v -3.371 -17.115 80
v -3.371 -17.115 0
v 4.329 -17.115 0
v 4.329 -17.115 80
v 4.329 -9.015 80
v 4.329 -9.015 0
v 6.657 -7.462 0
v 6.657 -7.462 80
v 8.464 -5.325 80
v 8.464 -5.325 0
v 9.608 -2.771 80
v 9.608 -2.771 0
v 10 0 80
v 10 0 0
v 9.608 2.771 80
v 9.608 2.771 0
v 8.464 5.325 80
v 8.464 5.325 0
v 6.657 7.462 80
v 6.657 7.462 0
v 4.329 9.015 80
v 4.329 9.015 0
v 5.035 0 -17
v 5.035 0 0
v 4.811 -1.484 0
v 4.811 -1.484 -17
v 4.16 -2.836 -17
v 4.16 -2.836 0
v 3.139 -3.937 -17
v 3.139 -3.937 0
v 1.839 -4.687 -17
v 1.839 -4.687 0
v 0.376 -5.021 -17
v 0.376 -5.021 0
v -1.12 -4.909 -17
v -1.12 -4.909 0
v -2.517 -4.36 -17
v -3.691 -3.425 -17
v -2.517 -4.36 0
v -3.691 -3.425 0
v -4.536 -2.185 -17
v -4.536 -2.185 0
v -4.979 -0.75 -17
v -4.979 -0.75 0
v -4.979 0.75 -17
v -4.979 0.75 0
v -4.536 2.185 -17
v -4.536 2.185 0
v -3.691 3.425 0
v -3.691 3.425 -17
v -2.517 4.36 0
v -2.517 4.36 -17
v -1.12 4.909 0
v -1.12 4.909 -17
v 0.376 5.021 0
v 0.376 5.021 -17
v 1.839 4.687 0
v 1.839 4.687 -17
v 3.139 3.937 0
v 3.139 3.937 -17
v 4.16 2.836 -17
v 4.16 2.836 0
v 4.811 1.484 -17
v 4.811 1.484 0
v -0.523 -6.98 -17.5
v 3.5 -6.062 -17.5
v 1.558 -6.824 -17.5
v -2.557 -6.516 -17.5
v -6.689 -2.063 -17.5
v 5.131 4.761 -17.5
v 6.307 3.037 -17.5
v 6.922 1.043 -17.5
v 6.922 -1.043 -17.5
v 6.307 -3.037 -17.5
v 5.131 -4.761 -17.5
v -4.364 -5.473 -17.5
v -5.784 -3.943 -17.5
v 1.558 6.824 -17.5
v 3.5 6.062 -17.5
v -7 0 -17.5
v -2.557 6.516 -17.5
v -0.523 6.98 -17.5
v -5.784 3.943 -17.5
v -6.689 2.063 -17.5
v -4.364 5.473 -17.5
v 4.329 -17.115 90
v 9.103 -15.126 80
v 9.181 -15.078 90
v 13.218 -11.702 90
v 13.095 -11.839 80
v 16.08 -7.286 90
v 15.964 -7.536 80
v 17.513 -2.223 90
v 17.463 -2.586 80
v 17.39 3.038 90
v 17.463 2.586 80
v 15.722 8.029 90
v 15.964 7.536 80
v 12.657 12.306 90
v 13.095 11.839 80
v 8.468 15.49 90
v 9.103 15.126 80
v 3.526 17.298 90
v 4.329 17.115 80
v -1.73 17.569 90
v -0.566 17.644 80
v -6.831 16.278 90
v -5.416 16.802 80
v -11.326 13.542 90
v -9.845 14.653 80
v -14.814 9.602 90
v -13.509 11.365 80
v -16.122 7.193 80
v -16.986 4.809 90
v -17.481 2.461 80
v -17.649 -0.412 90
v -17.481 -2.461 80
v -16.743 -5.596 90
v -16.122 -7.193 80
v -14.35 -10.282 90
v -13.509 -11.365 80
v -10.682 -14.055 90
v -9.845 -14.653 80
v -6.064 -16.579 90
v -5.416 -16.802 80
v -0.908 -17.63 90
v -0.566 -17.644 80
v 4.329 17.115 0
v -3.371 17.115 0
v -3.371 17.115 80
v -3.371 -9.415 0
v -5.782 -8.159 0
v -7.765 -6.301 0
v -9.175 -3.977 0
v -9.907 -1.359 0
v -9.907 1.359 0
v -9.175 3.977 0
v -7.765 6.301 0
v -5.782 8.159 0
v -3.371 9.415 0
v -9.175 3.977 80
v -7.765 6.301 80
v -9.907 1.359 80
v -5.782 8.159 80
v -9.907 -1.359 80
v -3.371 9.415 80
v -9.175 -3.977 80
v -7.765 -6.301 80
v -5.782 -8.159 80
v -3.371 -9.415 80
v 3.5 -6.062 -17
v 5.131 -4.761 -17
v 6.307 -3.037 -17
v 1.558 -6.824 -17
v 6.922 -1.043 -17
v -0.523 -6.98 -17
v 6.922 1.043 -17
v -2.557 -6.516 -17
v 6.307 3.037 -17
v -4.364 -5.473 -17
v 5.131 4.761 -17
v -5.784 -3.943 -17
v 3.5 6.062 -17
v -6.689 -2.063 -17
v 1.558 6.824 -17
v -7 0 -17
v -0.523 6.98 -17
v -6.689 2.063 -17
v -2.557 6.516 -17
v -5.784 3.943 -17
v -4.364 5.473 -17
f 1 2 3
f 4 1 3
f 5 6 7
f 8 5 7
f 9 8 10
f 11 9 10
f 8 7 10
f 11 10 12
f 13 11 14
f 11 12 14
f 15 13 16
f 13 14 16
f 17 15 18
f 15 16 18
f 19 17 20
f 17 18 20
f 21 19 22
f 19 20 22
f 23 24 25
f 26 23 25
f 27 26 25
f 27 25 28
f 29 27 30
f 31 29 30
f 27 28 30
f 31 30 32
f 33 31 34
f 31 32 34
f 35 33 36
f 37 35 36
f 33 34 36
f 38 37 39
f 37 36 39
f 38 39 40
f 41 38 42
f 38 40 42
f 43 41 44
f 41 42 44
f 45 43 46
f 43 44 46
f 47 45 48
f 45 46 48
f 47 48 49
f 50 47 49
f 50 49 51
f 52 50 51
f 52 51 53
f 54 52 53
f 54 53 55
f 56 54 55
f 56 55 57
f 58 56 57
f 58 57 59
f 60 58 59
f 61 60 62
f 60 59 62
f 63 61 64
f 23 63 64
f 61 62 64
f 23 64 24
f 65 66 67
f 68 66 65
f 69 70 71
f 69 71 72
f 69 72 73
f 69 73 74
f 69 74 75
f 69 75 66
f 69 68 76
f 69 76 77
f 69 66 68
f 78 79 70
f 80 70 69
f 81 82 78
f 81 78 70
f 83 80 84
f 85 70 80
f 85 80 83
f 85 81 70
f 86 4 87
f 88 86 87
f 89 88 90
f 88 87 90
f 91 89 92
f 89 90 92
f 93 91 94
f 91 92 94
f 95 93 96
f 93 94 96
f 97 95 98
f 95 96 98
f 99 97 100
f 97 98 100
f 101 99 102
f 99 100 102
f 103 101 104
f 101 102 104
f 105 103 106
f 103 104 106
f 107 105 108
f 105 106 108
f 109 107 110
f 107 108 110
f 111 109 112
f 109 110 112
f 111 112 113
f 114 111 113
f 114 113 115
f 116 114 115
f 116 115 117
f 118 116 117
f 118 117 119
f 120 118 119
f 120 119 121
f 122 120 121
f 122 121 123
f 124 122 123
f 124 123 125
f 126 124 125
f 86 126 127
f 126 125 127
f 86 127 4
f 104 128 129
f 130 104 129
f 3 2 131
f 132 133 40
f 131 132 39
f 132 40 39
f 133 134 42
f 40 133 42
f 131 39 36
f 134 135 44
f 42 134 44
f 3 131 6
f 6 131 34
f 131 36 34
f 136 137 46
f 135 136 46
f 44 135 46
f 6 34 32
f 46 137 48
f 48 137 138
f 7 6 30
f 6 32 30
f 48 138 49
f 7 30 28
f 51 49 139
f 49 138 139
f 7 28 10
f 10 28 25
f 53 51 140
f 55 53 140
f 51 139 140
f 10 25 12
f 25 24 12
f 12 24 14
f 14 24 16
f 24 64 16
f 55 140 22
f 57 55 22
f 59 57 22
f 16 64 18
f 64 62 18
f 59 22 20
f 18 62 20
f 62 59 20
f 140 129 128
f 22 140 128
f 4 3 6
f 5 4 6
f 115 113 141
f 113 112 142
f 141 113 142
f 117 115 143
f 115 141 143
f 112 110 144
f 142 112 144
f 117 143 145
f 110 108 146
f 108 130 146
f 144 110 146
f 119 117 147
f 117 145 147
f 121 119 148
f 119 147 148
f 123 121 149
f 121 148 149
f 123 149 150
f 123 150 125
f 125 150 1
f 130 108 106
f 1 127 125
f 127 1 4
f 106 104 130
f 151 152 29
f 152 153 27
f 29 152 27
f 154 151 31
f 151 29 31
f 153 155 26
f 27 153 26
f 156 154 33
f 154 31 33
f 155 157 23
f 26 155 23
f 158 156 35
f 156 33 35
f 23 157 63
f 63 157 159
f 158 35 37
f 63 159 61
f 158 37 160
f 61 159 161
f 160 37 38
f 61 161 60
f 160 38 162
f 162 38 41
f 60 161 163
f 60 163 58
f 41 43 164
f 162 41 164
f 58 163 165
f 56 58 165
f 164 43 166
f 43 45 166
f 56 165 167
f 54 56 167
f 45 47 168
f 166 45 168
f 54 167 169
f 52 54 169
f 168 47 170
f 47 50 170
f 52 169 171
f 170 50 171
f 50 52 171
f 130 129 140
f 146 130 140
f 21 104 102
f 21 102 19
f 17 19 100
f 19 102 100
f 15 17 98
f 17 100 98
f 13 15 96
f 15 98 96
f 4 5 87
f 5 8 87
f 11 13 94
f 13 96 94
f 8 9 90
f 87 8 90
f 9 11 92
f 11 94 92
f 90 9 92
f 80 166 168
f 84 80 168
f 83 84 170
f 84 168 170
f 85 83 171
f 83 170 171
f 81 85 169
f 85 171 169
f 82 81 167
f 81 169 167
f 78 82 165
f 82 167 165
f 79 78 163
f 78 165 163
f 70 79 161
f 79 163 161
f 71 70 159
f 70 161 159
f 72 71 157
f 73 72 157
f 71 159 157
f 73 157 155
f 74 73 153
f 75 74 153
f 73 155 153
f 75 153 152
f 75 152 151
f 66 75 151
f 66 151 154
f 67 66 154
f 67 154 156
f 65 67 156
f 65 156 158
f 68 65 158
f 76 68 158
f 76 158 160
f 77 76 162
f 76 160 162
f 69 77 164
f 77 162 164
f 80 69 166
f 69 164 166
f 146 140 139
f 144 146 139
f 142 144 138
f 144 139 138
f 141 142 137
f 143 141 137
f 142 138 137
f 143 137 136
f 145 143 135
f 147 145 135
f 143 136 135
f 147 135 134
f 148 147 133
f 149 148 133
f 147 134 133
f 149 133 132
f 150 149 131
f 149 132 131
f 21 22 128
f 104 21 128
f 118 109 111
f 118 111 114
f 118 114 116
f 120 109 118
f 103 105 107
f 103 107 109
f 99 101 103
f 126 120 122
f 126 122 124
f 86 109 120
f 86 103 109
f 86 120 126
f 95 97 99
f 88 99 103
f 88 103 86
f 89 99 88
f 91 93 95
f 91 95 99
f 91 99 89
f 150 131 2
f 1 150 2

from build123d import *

# Parameters (mm, degrees)
BOSS_EXTRUDE1_DEPTH = 80
SKETCH4_R           = 17.653500843
BOSS_EXTRUDE2_DEPTH = 10
SKETCH5_R           = 5.034978738
BOSS_EXTRUDE3_DEPTH = 17
SKETCH9_R           = 7
BOSS_EXTRUDE6_DEPTH = 0.5


with BuildPart() as part:
    # Sketch3 → Boss-Extrude1 (new body)
    with BuildSketch(Plane.XY):
        with BuildLine():
            Line((-3.371320853, -9.414573581), (-3.371320853, -17.114573581))
            Line((-3.371320853, -17.114573581), (4.328679147, -17.114573581))
            Line((4.328679147, -17.114573581), (4.328679147, -9.014573581))
            ThreePointArc((4.328679147, -9.014573581), (10, 0), (4.328679147, 9.014573581))
            Line((4.328679147, 9.014573581), (4.328679147, 17.114573581))
            Line((4.328679147, 17.114573581), (-3.371320853, 17.114573581))
            Line((-3.371320853, 17.114573581), (-3.371320853, 9.414573581))
            ThreePointArc((-3.371320853, 9.414573581), (-10, 0), (-3.371320853, -9.414573581))
        make_face()
    extrude(amount=BOSS_EXTRUDE1_DEPTH)

    # Sketch4 → Boss-Extrude2 (add)
    with BuildSketch(Plane.XY.offset(80)):
        with Locations(Location((0, 0, 0), (0, 0, 284.1937898))):
            Circle(SKETCH4_R)
    extrude(amount=BOSS_EXTRUDE2_DEPTH)

    # Sketch5 → Boss-Extrude3 (add)
    with BuildSketch(Plane(origin=(0, 0, 0), x_dir=(-1, 0, 0), z_dir=(0, 0, -1))):
        with Locations(Location((0, 0, 0), (0, 0, 180))):
            Circle(SKETCH5_R)
    extrude(amount=BOSS_EXTRUDE3_DEPTH)

    # Sketch9 → Boss-Extrude6 (add)
    with BuildSketch(Plane(origin=(0, 0, -17), x_dir=(-1, 0, 0), z_dir=(0, 0, -1))):
        Circle(SKETCH9_R)
    extrude(amount=BOSS_EXTRUDE6_DEPTH)


solid = part.part
